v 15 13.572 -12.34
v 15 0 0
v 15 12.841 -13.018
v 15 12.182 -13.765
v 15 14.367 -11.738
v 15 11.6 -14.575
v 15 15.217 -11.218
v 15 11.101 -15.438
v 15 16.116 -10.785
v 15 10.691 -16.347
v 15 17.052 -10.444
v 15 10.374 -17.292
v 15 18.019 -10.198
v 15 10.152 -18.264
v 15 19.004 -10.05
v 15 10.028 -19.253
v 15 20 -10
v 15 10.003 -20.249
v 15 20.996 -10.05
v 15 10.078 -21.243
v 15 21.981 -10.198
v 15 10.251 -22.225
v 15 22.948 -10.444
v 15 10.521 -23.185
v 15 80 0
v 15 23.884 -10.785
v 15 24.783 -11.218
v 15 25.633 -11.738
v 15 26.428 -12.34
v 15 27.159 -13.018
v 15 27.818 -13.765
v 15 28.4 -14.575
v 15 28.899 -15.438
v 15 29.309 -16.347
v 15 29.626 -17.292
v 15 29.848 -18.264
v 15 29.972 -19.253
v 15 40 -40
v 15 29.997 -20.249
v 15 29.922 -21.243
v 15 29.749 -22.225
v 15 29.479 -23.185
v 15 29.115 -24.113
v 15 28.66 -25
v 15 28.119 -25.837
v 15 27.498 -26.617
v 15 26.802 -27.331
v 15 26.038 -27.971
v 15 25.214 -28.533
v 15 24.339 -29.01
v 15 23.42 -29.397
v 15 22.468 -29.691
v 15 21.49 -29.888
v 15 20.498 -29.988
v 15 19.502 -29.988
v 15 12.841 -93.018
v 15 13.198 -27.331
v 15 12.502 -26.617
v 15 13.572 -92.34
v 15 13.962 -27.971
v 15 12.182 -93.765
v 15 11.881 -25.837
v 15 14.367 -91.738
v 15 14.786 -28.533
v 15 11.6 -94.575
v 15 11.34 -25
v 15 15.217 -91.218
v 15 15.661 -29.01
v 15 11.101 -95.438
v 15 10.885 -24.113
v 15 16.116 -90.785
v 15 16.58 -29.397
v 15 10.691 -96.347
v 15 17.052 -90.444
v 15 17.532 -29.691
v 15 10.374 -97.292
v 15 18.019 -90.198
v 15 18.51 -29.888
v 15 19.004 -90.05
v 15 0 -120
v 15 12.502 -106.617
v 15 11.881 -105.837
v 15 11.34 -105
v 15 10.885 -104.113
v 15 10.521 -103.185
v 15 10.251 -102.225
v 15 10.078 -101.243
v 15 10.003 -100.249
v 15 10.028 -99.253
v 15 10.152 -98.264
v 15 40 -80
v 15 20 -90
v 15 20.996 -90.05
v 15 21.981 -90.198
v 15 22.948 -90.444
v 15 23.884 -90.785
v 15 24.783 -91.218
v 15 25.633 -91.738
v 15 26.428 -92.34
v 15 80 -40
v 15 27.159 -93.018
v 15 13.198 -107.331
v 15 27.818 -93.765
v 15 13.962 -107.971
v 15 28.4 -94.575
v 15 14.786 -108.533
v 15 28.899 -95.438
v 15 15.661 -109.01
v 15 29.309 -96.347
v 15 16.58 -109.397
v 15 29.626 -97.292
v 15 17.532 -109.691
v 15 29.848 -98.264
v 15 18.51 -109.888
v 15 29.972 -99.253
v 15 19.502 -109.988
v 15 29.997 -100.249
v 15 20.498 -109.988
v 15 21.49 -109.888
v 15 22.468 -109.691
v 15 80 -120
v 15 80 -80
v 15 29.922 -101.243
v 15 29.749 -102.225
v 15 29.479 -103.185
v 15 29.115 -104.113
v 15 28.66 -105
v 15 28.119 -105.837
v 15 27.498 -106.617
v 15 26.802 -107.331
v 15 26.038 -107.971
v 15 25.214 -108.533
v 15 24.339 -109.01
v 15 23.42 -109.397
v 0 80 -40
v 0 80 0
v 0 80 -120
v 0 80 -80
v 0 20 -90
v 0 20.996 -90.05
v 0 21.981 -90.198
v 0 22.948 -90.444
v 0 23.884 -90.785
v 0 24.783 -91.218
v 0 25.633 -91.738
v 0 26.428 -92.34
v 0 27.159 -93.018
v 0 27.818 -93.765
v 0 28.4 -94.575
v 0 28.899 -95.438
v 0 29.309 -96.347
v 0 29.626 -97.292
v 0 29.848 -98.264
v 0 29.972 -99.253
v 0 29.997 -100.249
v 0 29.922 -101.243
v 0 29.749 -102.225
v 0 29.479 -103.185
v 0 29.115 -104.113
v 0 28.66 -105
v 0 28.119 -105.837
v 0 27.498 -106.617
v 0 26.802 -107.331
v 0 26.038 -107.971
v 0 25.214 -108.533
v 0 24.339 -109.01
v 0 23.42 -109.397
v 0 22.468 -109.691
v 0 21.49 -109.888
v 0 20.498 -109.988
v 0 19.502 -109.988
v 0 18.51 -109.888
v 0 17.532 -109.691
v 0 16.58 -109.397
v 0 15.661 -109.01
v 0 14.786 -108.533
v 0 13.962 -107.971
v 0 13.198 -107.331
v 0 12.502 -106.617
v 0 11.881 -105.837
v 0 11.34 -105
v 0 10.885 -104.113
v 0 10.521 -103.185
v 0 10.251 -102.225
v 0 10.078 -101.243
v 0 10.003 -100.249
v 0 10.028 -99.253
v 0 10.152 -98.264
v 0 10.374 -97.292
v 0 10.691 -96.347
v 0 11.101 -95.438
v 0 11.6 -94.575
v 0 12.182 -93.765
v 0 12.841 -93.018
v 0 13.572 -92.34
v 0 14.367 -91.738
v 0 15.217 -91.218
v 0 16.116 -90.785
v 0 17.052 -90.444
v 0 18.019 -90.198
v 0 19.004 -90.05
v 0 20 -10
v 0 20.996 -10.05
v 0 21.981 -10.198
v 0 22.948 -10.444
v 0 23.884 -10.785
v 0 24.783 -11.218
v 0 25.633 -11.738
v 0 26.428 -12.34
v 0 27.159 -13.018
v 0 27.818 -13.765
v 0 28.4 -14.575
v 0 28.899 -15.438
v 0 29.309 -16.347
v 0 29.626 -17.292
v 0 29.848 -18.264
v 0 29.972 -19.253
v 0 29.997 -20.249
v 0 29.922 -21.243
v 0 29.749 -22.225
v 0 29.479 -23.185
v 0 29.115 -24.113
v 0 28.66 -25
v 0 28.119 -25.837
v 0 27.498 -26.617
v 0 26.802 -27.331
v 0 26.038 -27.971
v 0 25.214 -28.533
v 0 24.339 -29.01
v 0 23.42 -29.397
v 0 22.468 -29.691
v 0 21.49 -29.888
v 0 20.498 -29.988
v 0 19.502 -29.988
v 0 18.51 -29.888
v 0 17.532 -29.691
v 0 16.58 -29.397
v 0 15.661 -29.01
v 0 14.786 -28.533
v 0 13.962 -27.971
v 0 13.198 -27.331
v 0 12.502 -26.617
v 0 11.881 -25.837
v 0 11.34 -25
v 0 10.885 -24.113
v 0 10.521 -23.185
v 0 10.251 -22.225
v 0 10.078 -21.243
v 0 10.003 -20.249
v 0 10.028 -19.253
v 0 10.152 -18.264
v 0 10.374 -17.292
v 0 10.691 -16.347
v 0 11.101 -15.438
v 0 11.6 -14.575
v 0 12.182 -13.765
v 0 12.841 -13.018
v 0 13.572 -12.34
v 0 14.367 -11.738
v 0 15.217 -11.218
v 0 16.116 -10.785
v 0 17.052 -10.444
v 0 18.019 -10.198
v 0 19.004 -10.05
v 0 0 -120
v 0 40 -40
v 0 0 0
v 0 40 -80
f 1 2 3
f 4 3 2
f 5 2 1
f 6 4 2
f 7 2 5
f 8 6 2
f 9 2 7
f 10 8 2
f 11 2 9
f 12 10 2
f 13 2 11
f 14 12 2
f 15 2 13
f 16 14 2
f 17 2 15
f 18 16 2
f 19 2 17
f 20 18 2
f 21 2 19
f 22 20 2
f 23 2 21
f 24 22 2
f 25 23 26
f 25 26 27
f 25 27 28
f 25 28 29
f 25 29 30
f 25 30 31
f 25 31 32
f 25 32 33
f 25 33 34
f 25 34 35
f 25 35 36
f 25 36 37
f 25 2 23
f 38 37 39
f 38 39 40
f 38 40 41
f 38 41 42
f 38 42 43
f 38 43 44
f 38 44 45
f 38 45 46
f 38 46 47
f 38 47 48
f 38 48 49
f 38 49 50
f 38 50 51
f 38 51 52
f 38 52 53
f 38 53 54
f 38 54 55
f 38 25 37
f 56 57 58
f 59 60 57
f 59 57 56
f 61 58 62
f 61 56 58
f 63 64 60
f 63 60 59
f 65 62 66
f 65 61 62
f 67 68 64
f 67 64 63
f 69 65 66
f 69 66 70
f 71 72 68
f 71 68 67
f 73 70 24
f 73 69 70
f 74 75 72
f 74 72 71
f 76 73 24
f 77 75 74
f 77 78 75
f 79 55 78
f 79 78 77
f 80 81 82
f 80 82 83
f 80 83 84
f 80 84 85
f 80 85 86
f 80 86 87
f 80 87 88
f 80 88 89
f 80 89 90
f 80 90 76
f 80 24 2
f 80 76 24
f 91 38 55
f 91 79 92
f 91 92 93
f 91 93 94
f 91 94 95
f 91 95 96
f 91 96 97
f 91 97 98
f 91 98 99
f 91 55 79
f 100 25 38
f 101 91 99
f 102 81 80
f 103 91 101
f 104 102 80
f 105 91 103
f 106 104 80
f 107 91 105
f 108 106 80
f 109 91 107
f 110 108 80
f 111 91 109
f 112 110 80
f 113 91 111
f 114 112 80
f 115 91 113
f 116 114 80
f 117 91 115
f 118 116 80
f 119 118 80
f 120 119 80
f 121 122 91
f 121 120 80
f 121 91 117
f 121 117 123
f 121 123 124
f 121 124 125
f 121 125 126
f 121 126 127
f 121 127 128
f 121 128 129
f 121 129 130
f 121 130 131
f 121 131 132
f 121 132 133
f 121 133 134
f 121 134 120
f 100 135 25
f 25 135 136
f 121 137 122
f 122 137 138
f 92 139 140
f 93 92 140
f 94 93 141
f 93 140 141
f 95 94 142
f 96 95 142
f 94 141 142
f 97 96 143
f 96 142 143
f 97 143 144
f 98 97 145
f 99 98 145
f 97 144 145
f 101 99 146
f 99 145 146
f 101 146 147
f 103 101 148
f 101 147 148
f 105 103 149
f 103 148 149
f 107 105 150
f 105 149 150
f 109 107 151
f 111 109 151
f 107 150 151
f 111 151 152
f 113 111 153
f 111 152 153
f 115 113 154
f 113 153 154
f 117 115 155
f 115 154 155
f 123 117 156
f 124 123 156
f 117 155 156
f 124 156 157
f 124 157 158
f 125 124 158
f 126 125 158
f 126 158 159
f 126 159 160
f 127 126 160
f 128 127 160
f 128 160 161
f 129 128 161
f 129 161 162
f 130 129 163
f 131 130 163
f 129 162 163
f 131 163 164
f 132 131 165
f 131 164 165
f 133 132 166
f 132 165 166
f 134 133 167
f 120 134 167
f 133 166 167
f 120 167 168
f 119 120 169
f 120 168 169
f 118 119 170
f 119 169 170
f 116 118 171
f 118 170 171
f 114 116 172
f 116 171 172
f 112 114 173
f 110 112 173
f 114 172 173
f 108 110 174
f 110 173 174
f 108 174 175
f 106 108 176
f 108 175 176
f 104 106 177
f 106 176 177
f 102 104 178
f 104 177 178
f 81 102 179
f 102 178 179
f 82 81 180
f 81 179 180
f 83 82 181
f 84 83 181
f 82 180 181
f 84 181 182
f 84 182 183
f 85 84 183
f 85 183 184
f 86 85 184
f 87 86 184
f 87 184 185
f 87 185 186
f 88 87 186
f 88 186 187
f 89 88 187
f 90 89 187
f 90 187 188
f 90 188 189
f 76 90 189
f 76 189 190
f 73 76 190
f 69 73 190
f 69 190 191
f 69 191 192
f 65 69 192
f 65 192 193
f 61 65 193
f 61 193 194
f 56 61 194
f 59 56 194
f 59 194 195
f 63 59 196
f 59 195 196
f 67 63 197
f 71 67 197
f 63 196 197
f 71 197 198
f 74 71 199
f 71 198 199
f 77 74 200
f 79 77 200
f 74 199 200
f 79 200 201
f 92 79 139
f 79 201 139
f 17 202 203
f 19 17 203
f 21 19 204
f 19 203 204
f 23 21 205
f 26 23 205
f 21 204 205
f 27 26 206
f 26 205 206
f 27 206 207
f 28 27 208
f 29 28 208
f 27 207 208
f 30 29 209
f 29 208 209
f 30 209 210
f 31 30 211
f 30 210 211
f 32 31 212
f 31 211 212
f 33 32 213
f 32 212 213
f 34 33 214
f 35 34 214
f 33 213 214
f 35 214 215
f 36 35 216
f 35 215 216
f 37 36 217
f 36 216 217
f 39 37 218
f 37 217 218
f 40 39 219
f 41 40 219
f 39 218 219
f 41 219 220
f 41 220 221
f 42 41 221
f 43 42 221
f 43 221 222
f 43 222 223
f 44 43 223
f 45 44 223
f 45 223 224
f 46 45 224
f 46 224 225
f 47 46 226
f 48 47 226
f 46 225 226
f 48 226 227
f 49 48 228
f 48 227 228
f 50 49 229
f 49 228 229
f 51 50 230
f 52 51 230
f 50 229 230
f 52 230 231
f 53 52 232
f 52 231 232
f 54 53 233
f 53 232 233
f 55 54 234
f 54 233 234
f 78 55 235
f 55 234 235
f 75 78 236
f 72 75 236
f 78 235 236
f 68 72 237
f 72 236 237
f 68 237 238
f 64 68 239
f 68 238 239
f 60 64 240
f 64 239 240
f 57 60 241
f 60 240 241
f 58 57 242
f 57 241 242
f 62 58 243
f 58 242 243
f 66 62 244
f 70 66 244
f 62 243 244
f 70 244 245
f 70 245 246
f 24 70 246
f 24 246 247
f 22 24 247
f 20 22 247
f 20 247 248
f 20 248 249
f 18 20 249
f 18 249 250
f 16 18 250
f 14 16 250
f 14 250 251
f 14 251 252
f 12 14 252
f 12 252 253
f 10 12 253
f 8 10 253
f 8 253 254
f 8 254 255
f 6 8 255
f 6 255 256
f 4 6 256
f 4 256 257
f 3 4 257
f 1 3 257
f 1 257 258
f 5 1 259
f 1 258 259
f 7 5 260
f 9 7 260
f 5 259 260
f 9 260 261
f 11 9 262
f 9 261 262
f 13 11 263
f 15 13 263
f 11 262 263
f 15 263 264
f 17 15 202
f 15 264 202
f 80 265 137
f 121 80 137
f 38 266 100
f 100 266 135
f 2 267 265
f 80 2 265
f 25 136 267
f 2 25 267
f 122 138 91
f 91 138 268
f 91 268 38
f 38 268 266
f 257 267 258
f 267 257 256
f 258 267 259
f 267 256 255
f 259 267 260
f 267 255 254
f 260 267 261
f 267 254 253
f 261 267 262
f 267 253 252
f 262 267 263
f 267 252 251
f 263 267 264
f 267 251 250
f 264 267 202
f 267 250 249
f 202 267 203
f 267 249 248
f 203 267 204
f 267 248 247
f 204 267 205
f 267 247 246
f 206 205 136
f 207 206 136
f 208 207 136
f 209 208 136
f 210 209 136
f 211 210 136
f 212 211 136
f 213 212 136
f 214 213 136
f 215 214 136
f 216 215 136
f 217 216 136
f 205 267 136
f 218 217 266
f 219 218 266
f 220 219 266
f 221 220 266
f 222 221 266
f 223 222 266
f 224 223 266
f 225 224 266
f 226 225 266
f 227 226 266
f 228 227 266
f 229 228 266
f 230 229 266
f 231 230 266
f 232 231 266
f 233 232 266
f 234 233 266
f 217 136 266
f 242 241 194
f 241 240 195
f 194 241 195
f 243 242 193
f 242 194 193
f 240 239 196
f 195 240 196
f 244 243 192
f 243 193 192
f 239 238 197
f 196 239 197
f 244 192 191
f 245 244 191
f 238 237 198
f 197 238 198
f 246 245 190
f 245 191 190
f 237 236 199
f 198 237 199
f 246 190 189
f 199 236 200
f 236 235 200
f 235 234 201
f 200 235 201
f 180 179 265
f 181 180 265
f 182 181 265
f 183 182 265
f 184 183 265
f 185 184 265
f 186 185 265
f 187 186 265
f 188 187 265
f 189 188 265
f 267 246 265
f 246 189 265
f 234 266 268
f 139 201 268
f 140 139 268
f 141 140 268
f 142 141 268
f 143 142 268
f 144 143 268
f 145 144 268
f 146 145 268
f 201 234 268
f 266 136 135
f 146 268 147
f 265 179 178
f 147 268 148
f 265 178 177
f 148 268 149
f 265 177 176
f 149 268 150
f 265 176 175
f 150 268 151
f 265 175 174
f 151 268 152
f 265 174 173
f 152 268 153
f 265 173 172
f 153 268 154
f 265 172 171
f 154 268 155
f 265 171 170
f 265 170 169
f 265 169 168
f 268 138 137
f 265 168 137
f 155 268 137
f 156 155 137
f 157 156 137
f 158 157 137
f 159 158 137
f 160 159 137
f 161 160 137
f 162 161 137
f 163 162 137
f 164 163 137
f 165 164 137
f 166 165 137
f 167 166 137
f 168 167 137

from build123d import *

# Parameters (mm, degrees)
BOSS_EXTRUDE1_DEPTH = 15
SKETCH5_R           = 10
CUT_EXTRUDE1_DEPTH  = 15


with BuildPart() as part:
    # Sketch3 → Boss-Extrude1 (new body)
    with BuildSketch(Plane(origin=(0, 0, 0), x_dir=(0, 0, -1), z_dir=(1, 0, 0))):
        Polygon((0, 0), (120, 0), (120, 80), (80, 80), (80, 40), (40, 40), (40, 80), (0, 80), align=None)
    extrude(amount=BOSS_EXTRUDE1_DEPTH)

    # Sketch5 → Cut-Extrude1 (cut)
    with BuildSketch(Plane.ZY):
        with Locations((-100, 20)):
            Circle(SKETCH5_R)
        with Locations((-20, 20)):
            Circle(SKETCH5_R)
    extrude(amount=-CUT_EXTRUDE1_DEPTH, mode=Mode.SUBTRACT)


solid = part.part
